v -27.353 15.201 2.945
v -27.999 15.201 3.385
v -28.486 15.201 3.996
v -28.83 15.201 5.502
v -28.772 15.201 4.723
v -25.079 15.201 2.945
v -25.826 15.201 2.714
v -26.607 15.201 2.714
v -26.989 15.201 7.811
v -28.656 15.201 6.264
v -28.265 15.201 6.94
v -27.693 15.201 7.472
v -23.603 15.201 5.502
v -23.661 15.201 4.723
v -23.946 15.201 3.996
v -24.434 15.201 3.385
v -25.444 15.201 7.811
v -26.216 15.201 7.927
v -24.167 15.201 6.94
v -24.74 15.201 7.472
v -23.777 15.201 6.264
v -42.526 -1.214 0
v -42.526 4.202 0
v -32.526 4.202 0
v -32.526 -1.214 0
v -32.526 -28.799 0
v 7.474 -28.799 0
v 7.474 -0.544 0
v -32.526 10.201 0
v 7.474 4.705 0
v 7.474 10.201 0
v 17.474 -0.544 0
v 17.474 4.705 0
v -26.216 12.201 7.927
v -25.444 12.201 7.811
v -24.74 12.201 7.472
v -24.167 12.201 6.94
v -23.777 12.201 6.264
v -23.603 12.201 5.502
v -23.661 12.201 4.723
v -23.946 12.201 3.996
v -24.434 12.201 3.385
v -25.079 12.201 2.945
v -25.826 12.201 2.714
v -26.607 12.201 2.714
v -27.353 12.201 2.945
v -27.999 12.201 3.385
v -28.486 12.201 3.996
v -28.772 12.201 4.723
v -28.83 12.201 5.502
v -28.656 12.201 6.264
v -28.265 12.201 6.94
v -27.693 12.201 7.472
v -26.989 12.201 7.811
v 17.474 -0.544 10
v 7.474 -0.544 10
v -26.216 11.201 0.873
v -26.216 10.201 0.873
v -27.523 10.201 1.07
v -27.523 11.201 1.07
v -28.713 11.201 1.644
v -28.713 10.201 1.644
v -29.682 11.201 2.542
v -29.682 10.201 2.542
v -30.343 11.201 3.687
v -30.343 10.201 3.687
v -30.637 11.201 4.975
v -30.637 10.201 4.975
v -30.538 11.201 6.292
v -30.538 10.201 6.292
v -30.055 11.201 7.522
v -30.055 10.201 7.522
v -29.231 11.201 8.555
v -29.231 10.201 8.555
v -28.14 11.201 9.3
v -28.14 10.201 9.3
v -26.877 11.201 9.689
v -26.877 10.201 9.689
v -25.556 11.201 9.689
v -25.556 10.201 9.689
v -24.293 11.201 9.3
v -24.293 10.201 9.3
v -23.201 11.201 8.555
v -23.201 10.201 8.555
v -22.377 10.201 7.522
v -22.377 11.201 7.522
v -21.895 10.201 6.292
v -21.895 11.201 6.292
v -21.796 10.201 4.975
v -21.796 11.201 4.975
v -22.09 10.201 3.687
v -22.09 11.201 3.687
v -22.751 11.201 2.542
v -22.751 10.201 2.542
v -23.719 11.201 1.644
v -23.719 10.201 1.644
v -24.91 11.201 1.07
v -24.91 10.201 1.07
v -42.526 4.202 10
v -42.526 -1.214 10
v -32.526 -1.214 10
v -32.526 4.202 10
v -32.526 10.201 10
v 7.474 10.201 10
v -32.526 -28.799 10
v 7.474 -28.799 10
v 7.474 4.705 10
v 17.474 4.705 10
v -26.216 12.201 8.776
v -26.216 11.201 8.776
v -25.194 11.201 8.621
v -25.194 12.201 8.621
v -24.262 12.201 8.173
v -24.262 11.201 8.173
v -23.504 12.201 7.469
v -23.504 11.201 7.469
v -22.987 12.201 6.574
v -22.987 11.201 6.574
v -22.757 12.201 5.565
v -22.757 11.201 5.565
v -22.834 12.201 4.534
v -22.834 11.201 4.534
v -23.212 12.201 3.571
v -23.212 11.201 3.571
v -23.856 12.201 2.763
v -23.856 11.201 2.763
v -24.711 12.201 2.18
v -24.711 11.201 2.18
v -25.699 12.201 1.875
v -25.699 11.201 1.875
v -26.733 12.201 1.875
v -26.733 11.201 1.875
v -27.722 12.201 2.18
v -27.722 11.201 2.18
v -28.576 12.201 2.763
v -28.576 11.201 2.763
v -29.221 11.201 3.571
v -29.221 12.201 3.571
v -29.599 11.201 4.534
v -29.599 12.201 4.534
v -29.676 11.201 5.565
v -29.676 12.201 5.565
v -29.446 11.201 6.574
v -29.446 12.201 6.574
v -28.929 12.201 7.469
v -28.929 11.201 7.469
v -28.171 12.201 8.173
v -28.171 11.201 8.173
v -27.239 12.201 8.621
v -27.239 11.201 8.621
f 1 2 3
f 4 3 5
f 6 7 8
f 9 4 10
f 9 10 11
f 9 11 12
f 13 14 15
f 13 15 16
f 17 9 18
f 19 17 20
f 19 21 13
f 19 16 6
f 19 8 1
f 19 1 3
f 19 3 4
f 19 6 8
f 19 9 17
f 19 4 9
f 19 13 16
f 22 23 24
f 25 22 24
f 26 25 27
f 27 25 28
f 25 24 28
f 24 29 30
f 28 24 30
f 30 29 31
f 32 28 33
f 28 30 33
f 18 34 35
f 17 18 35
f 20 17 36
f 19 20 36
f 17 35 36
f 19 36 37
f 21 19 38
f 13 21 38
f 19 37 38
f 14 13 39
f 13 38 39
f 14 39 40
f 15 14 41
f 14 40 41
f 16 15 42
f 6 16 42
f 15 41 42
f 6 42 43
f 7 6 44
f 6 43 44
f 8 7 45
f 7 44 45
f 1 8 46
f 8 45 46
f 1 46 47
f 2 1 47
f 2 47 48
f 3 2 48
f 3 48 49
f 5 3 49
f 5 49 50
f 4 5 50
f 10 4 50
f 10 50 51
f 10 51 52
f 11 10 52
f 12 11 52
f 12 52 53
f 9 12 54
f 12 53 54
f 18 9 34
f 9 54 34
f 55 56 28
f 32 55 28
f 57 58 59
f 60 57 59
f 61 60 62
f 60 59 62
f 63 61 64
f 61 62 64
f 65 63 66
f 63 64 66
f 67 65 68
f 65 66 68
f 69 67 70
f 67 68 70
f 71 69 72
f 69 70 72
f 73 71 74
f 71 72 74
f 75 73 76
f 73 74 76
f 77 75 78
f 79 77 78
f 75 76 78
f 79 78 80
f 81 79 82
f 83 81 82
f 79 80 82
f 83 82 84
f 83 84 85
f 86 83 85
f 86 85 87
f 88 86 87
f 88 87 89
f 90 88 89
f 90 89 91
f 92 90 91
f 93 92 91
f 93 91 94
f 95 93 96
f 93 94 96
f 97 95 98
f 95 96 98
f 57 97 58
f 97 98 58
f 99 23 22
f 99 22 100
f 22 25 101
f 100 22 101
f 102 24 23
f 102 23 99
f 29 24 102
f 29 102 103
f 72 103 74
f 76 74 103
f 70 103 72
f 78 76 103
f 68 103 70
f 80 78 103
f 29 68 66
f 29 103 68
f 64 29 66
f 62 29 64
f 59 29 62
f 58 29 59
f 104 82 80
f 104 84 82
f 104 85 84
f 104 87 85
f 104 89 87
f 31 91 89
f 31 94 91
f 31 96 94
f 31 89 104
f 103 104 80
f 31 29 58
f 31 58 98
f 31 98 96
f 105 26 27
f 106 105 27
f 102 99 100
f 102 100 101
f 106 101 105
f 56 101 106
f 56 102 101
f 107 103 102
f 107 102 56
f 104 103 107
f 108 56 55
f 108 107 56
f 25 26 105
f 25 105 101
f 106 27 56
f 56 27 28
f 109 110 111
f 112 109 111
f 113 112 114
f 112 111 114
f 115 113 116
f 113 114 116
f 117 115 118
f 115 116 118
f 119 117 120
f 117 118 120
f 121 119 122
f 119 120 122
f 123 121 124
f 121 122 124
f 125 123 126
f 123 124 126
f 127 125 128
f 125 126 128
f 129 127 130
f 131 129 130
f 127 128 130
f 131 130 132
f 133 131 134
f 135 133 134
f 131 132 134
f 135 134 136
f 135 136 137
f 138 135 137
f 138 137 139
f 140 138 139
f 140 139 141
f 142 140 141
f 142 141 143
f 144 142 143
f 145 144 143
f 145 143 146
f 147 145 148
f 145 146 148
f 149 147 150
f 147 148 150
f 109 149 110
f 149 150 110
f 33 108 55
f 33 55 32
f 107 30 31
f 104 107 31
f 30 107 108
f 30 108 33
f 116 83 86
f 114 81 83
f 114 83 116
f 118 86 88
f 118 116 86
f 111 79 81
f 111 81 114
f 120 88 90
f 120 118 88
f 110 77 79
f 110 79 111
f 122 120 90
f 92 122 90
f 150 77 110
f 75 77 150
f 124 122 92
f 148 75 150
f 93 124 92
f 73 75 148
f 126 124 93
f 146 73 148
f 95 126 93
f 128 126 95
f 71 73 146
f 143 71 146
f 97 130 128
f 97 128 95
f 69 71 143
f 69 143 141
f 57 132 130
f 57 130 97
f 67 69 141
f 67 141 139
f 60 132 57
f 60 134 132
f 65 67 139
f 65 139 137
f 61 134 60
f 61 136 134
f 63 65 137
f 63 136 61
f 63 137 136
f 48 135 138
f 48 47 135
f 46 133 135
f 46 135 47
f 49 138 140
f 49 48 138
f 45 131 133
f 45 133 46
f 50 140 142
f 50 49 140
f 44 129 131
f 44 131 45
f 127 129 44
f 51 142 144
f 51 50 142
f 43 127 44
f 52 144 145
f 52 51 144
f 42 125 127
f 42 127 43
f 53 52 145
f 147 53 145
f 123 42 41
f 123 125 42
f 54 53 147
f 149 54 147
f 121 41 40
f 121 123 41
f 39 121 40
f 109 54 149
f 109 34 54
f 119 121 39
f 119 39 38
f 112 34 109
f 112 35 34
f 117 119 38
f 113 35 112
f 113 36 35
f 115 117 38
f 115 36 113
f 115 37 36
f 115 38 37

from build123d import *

# Parameters (mm, degrees)
SKETCH_1_W      = 40
SKETCH_1_H      = 39
EXTRUDE_1_DEPTH = 10
SKETCH_2_R      = 4.432676277
EXTRUDE_4_DEPTH = 1
SKETCH_3_R      = 3.469401761
EXTRUDE_5_DEPTH = 1
SKETCH_5_R      = 2.620946211
EXTRUDE_6_DEPTH = 3
SKETCH_6_W      = 10
SKETCH_6_H      = 5.416587347
EXTRUDE_7_DEPTH = 10
SKETCH_7_W      = 10
SKETCH_7_H      = 5.249064027
EXTRUDE_8_DEPTH = 10


with BuildPart() as part:
    # 草图1 → 凸台-拉伸1 (new body)
    with BuildSketch(Plane.XY):
        with Locations((-12.52596939, -9.298515699)):
            Rectangle(SKETCH_1_W, SKETCH_1_H)
    extrude(amount=EXTRUDE_1_DEPTH)

    # 草图2 → 凸台-拉伸4 (add)
    with BuildSketch(Plane(origin=(0, 10.201484301, 0), x_dir=(1, 0, 0), z_dir=(0, 1, 0))):
        with Locations(Location((-26.216270459, -5.306111922, 0), (0, 0, 90))):
            Circle(SKETCH_2_R)
    extrude(amount=EXTRUDE_4_DEPTH)

    # 草图3 → 凸台-拉伸5 (add)
    with BuildSketch(Plane(origin=(0, 11.201484301, 0), x_dir=(1, 0, 0), z_dir=(0, 1, 0))):
        with Locations(Location((-26.216270459, -5.306111922, 0), (0, 0, 270))):
            Circle(SKETCH_3_R)
    extrude(amount=EXTRUDE_5_DEPTH)

    # 草图5 → 凸台-拉伸6 (add)
    with BuildSketch(Plane(origin=(0, 12.201484301, 0), x_dir=(1, 0, 0), z_dir=(0, 1, 0))):
        with Locations(Location((-26.216270459, -5.306111922, 0), (0, 0, 270))):
            Circle(SKETCH_5_R)
    extrude(amount=EXTRUDE_6_DEPTH)

    # 草图6 → 凸台-拉伸7 (add)
    with BuildSketch(Plane.ZY.offset(32.52596939)):
        with Locations((5, 1.493888641)):
            Rectangle(SKETCH_6_W, SKETCH_6_H)
    extrude(amount=EXTRUDE_7_DEPTH)

    # 草图7 → 凸台-拉伸8 (add)
    with BuildSketch(Plane(origin=(7.47403061, 0, 0), x_dir=(0, 0, -1), z_dir=(1, 0, 0))):
        with Locations((-5, 2.080220262)):
            Rectangle(SKETCH_7_W, SKETCH_7_H)
    extrude(amount=EXTRUDE_8_DEPTH)


solid = part.part
